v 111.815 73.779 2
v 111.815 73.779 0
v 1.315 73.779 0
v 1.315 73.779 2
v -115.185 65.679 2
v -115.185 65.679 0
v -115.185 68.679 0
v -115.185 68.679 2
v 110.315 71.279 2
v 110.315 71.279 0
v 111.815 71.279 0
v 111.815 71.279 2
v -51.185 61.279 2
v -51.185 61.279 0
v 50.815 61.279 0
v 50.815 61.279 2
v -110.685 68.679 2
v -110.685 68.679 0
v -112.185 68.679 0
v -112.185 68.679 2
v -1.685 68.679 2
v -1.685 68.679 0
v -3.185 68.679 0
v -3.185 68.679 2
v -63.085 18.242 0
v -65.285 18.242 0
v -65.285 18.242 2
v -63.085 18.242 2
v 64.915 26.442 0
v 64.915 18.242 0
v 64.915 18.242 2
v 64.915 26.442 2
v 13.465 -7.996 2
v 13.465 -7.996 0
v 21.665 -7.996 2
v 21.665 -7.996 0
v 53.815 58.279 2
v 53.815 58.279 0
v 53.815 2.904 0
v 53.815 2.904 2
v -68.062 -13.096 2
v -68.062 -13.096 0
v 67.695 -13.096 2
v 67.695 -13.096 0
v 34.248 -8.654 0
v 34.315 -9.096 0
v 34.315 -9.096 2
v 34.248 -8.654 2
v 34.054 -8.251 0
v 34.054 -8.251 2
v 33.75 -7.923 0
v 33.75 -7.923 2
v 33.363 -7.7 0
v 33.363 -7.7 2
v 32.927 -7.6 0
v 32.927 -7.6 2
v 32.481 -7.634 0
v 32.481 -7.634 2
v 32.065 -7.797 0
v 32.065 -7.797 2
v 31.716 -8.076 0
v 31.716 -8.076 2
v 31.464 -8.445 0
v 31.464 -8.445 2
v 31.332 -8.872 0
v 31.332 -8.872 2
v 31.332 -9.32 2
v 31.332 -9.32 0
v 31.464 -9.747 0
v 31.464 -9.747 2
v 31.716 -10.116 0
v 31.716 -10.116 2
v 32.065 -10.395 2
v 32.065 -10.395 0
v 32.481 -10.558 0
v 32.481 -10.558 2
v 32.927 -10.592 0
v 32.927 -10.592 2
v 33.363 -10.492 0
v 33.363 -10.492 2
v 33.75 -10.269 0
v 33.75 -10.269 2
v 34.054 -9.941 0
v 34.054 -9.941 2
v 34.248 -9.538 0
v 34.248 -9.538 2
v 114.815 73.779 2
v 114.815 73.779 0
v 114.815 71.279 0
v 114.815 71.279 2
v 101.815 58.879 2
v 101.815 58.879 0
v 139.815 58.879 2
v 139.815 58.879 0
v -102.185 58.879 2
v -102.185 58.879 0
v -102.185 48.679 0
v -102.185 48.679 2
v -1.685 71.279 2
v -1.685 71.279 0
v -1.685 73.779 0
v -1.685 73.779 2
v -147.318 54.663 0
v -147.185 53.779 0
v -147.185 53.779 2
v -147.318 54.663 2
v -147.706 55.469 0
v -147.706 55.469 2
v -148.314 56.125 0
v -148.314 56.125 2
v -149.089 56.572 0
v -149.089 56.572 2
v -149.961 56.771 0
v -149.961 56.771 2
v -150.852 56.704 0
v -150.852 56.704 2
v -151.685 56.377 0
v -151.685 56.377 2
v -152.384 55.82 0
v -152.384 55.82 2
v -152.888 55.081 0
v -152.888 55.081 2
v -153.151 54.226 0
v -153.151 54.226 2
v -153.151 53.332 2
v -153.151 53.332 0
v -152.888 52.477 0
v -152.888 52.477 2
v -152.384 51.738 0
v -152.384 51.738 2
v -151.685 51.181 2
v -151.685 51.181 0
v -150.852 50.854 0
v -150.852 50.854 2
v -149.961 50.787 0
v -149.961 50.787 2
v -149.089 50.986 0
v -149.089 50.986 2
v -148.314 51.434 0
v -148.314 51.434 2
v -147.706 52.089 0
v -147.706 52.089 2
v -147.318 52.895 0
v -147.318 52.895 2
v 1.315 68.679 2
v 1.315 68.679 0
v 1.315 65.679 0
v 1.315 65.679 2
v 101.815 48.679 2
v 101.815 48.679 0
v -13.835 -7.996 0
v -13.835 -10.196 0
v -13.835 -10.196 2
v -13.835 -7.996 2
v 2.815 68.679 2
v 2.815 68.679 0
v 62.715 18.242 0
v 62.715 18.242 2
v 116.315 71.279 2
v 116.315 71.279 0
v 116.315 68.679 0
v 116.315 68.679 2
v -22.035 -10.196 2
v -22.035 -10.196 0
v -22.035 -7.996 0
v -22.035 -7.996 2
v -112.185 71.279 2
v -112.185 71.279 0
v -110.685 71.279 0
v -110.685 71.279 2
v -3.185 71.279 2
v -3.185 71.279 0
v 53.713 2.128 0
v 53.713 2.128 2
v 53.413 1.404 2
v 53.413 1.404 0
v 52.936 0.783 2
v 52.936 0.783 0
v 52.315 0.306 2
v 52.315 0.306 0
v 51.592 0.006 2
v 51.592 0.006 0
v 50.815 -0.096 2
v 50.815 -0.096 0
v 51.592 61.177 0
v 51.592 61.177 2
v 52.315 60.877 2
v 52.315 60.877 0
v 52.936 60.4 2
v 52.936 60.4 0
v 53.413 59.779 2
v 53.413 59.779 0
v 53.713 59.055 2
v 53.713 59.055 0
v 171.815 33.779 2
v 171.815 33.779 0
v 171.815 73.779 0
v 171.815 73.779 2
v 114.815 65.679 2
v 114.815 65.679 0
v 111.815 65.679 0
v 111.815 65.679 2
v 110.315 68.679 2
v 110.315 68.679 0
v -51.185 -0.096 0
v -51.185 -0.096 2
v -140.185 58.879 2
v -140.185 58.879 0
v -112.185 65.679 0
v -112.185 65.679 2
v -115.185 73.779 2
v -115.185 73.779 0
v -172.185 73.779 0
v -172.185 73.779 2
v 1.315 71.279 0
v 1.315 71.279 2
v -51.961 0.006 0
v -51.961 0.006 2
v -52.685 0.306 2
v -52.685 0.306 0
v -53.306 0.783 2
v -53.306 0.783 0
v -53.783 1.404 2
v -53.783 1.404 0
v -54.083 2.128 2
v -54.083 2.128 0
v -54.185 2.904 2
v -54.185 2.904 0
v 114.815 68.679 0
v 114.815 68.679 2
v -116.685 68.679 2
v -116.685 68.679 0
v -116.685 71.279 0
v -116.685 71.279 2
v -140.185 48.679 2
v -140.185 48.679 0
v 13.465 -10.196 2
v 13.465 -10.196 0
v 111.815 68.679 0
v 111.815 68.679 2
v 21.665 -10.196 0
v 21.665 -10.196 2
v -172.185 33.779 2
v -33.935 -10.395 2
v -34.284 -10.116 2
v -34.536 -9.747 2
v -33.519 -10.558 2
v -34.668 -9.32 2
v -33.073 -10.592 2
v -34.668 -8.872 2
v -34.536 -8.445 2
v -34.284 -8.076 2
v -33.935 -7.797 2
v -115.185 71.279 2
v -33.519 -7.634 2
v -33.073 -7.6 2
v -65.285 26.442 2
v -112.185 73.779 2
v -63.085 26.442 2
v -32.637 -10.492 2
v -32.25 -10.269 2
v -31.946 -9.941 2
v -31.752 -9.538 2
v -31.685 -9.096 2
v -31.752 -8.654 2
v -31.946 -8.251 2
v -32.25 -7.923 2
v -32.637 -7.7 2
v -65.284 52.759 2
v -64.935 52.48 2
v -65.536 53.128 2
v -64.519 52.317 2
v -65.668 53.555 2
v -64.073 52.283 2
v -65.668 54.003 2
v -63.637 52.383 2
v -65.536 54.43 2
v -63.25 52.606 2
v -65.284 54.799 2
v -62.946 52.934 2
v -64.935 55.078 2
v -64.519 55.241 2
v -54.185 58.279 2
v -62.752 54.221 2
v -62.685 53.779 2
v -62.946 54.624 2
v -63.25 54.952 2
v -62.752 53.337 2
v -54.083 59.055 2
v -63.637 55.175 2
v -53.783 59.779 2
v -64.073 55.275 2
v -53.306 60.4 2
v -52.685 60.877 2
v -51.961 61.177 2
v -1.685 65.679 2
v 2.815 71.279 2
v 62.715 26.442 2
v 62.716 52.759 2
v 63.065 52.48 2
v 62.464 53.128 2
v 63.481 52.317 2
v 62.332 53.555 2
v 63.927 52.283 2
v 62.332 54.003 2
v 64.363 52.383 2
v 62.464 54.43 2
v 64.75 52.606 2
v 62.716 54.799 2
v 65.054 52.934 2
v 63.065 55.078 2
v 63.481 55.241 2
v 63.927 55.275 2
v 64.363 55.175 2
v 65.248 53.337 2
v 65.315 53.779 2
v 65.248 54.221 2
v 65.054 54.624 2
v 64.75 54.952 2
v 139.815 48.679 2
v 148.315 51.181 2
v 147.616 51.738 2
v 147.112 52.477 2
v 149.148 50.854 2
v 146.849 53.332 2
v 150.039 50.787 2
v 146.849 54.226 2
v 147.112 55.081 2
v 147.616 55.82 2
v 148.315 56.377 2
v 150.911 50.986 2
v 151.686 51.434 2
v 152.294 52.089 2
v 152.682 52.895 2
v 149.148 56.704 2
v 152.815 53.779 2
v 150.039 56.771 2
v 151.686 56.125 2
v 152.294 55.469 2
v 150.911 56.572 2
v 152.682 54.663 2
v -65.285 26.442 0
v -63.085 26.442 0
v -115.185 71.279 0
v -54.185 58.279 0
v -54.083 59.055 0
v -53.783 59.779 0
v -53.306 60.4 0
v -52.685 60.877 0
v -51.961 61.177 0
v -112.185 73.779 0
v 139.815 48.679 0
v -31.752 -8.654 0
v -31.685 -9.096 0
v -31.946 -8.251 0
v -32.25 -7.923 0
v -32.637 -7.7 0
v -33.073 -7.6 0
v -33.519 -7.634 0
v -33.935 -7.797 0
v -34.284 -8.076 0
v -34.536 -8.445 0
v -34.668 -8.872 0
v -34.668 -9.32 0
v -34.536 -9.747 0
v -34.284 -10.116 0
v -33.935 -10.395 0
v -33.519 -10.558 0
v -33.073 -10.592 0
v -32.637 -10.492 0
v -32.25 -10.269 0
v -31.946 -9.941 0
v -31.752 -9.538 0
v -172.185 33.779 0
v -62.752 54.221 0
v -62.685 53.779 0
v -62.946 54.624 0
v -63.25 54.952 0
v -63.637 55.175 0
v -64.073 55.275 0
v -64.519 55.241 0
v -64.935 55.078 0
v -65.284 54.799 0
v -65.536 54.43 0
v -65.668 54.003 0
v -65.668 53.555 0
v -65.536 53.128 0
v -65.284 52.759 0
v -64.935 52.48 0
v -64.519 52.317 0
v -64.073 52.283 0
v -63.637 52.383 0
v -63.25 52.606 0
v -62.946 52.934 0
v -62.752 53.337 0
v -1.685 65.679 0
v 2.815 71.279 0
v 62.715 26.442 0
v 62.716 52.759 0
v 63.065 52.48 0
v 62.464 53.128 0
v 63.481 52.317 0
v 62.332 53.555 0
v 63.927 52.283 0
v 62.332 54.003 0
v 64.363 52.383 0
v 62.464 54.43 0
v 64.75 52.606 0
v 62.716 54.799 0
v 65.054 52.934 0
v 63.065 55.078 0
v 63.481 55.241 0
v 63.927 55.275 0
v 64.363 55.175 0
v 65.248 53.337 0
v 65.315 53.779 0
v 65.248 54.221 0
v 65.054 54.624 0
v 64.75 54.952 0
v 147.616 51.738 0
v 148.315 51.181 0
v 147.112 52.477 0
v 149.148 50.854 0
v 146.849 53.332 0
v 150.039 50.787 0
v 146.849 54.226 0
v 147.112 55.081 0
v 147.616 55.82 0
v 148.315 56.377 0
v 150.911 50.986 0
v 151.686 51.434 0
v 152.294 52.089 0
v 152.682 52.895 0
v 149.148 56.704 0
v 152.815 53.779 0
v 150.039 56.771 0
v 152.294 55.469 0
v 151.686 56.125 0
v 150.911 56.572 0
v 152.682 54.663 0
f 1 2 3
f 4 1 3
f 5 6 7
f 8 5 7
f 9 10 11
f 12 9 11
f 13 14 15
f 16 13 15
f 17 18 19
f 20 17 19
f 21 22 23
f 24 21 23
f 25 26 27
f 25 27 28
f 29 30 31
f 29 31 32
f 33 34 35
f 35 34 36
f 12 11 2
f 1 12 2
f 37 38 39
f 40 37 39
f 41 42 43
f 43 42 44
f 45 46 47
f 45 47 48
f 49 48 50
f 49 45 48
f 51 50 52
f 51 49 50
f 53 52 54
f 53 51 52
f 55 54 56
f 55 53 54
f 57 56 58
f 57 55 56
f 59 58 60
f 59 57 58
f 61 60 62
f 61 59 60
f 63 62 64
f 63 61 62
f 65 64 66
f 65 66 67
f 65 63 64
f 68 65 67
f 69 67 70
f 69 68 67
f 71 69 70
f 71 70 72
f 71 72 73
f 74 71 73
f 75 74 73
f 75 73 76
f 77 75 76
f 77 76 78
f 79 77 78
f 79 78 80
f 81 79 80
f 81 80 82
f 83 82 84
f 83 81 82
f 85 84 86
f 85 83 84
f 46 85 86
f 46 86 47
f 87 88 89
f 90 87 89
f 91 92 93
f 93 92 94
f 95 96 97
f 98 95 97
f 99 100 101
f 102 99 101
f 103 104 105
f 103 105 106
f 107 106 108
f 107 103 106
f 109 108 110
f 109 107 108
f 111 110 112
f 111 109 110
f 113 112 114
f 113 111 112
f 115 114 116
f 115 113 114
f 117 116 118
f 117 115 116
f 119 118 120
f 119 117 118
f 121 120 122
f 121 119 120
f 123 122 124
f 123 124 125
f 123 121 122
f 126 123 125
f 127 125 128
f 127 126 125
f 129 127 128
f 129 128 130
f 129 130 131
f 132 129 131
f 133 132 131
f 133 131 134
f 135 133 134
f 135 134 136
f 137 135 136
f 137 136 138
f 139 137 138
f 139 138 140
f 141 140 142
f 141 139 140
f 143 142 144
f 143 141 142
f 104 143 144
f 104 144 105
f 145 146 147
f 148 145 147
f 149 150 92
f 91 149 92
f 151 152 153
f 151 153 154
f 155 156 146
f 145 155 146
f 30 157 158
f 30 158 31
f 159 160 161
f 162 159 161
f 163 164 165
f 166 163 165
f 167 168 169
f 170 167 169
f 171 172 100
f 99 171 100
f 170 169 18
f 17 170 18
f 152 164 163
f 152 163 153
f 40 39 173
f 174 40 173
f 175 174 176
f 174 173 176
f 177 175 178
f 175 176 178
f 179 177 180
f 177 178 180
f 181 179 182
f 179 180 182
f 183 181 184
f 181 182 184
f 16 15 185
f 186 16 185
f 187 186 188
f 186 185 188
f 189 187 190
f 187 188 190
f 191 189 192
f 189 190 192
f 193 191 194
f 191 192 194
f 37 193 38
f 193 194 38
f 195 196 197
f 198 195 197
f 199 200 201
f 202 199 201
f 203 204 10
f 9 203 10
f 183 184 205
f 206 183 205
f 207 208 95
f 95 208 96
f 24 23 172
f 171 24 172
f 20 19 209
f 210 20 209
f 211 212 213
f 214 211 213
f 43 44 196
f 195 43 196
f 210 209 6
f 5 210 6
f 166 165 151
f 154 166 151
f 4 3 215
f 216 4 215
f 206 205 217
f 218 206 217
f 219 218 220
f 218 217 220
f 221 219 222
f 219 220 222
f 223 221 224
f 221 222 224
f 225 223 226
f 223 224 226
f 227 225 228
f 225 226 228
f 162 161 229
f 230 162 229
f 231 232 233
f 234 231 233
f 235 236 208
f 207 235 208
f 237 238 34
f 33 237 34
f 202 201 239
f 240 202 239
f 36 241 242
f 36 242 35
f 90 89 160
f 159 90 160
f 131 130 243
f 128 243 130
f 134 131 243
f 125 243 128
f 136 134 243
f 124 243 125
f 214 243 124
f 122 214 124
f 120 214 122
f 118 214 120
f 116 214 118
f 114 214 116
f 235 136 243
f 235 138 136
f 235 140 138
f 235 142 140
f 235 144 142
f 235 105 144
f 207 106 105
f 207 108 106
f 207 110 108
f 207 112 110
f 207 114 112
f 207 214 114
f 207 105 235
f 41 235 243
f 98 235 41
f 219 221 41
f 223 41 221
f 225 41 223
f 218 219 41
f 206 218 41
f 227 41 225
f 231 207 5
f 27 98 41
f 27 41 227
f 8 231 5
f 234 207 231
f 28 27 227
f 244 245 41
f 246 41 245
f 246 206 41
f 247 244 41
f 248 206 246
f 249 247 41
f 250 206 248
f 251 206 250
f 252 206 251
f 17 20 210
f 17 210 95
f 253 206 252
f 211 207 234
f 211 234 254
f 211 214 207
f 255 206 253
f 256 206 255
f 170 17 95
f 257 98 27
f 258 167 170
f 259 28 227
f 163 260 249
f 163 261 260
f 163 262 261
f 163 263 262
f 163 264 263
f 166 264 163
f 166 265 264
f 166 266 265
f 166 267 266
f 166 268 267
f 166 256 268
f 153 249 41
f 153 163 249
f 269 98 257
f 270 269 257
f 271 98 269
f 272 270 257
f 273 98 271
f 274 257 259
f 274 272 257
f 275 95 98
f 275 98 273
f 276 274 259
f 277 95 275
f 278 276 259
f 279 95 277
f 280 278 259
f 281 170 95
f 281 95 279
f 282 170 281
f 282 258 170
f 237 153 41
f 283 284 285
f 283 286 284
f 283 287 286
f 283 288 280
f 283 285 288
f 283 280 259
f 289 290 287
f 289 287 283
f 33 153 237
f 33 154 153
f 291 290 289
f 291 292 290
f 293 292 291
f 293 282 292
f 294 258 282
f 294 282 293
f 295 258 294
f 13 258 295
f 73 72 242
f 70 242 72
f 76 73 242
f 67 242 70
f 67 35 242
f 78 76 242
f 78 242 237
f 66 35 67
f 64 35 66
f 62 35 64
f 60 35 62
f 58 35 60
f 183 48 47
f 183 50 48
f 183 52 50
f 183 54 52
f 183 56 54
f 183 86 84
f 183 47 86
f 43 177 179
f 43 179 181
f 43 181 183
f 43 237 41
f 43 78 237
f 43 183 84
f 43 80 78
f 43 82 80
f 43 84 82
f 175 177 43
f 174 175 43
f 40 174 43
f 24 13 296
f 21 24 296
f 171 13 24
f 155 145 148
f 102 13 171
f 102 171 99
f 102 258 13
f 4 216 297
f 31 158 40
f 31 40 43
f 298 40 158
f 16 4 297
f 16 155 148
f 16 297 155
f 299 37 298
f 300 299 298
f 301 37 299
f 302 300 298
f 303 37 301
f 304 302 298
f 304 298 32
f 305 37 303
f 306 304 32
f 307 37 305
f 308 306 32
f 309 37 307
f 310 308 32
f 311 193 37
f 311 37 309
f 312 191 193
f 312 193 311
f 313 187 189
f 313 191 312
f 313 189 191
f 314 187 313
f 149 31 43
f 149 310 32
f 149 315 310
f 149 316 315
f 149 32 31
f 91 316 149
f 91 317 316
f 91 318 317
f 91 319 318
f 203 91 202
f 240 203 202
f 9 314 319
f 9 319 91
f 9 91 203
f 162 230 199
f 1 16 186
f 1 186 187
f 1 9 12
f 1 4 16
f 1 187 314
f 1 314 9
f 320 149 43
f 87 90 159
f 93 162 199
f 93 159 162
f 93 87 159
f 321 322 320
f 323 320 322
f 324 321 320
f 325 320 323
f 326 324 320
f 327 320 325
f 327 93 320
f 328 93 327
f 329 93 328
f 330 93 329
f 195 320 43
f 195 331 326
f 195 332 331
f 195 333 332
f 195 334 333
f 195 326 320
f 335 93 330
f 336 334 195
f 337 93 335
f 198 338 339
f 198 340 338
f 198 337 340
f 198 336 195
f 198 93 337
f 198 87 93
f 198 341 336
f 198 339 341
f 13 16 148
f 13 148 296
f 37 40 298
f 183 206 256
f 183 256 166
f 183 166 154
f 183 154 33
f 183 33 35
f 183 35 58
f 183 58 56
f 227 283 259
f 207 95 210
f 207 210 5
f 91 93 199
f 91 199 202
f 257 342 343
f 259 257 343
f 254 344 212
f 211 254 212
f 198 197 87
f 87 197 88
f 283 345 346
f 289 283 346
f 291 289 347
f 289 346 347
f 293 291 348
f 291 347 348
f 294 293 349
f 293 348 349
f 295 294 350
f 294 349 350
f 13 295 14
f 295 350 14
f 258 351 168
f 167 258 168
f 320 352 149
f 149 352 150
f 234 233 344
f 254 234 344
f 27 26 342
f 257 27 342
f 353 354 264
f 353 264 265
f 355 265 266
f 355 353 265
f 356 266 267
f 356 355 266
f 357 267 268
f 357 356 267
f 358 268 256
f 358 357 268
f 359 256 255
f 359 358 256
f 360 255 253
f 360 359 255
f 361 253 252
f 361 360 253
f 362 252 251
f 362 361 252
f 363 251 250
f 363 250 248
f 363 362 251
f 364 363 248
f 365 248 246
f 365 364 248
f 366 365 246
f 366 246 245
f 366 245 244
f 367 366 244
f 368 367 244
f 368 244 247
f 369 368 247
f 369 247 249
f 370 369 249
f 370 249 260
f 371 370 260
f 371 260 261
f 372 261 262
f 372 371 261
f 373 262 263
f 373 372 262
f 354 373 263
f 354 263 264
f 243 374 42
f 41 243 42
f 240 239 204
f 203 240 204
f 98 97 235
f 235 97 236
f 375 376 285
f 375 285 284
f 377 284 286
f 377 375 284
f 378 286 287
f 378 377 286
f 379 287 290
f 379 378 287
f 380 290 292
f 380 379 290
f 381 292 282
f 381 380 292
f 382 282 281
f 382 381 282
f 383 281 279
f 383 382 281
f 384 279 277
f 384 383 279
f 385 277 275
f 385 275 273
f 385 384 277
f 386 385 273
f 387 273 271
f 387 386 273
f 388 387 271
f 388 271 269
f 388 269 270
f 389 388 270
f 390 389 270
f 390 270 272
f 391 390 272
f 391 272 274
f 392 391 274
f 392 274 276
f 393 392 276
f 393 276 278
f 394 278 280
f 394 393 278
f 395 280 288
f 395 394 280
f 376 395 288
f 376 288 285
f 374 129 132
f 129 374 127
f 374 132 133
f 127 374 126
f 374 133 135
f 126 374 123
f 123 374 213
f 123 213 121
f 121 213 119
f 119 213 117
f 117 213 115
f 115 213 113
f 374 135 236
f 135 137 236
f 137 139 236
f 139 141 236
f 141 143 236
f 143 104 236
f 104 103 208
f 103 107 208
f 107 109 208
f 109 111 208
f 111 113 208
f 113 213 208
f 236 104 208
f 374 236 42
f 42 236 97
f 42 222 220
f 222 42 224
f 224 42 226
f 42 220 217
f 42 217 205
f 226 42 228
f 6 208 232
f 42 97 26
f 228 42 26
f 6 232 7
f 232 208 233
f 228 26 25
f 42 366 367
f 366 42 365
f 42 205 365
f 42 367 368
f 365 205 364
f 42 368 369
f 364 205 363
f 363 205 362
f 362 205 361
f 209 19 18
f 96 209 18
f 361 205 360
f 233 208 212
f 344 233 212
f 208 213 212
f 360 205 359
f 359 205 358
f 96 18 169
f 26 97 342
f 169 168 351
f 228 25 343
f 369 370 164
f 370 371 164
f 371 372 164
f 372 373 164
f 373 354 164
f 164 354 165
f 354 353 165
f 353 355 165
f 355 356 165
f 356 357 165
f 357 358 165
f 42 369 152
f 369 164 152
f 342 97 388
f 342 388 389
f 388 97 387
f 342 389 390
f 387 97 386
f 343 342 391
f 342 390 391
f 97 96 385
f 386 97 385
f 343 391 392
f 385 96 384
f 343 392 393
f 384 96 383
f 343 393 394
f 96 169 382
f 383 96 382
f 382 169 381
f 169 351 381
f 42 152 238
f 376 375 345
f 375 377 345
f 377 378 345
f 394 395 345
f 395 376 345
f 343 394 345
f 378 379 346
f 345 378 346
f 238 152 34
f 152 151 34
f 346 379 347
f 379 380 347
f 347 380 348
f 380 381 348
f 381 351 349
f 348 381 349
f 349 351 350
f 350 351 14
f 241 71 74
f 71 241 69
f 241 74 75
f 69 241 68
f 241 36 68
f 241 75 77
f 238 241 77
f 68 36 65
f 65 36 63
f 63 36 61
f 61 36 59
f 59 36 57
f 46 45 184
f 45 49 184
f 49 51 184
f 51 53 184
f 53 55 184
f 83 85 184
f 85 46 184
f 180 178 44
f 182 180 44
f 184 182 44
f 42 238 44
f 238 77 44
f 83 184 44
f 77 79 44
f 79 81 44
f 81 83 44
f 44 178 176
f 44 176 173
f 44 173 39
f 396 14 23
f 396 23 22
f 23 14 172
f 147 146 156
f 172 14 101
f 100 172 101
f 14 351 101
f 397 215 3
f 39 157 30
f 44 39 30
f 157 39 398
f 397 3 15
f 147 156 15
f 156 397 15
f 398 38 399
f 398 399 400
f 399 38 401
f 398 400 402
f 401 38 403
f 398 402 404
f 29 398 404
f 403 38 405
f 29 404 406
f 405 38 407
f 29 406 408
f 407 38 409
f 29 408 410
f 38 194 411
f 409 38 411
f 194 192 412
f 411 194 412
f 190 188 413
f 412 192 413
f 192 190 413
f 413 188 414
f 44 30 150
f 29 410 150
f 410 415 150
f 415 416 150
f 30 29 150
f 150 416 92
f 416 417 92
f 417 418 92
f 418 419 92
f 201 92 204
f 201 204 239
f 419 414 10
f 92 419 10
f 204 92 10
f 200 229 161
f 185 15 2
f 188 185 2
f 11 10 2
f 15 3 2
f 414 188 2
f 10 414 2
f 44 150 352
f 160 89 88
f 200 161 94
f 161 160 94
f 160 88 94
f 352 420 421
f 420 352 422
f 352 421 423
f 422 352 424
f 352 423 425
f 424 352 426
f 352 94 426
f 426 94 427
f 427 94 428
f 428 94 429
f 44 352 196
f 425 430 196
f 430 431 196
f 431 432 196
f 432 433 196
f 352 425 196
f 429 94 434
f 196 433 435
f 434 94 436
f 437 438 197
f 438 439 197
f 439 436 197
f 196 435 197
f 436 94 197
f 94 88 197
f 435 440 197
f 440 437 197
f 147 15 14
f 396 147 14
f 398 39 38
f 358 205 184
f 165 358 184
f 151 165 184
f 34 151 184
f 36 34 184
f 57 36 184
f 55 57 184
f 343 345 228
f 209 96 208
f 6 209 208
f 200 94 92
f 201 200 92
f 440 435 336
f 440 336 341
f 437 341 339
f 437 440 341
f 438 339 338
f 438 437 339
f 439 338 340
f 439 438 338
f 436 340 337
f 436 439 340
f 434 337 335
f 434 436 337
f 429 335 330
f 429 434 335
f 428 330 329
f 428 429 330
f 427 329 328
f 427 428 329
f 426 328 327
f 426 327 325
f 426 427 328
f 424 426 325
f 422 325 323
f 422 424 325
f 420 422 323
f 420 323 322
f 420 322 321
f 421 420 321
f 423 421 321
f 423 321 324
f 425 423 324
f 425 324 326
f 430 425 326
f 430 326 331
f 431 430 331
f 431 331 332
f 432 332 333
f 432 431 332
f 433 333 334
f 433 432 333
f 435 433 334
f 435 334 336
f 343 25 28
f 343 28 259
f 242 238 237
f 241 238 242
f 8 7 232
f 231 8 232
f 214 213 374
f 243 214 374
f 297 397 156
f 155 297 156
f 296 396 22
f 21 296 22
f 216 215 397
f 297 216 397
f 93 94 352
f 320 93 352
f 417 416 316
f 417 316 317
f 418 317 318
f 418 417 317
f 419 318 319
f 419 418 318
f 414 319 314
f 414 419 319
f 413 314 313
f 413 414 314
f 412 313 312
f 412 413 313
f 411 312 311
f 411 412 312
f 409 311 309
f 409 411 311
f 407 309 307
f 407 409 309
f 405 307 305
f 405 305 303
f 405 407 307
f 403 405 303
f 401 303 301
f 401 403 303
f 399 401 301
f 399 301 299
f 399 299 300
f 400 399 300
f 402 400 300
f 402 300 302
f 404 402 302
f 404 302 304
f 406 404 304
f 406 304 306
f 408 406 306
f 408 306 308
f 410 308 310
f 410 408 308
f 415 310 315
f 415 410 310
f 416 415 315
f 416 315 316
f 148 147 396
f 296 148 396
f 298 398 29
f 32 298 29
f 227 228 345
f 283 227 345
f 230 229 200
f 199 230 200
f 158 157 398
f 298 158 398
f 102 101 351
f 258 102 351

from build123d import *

# Parameters (mm, degrees)
SKETCH_1_R      = 1.5
SKETCH_1_W      = 8.2
SKETCH_1_H      = 2.2
SKETCH_1_W_2    = 2.2
SKETCH_1_H_2    = 8.2
SKETCH_1_R_2    = 3
EXTRUDE_1_DEPTH = 2


with BuildPart() as part:
    # 草图1 → 凸台-拉伸1 (new body)
    with BuildSketch(Plane.XY):
        Polygon((-68.061769393, -13.095981945), (-52.184883937, -13.095981945), (-18.934883937, -13.095981945), (18.565116063, -13.095981945), (67.695116063, -13.095981945), (171.815116063, 33.779018055), (171.815116063, 73.779018055), (114.815116063, 73.779018055), (114.815116063, 71.279018055), (116.315116063, 71.279018055), (116.315116063, 68.679018055), (114.815116063, 68.679018055), (114.815116063, 65.679018055), (111.815116063, 65.679018055), (111.815116063, 68.679018055), (110.315116063, 68.679018055), (110.315116063, 71.279018055), (111.815116063, 71.279018055), (111.815116063, 73.779018055), (1.315116063, 73.779018055), (1.315116063, 71.279018055), (2.815116063, 71.279018055), (2.815116063, 68.679018055), (1.315116063, 68.679018055), (1.315116063, 65.679018055), (-1.684883937, 65.679018055), (-1.684883937, 68.679018055), (-3.184883937, 68.679018055), (-3.184883937, 71.279018055), (-1.684883937, 71.279018055), (-1.684883937, 73.779018055), (-68.061769393, 73.779018055), (-112.184883937, 73.779018055), (-112.184883937, 71.279018055), (-110.684883937, 71.279018055), (-110.684883937, 68.679018055), (-112.184883937, 68.679018055), (-112.184883937, 65.679018055), (-115.184883937, 65.679018055), (-115.184883937, 68.679018055), (-116.684883937, 68.679018055), (-116.684883937, 71.279018055), (-115.184883937, 71.279018055), (-115.184883937, 73.779018055), (-172.184883937, 73.779018055), (-172.184883937, 33.779018055), align=None)
        with Locations((-33.184883937, -9.095981945)):
            Circle(SKETCH_1_R, mode=Mode.SUBTRACT)
        with Locations((-17.934883937, -9.095981946)):
            Rectangle(SKETCH_1_W, SKETCH_1_H, mode=Mode.SUBTRACT)
        with Locations((-64.184883937, 22.341518055)):
            Rectangle(SKETCH_1_W_2, SKETCH_1_H_2, mode=Mode.SUBTRACT)
        with Locations((17.565116063, -9.095981946)):
            Rectangle(SKETCH_1_W, SKETCH_1_H, mode=Mode.SUBTRACT)
        with Locations((32.815116063, -9.095981945)):
            Circle(SKETCH_1_R, mode=Mode.SUBTRACT)
        with Locations((63.815116063, 22.341518055)):
            Rectangle(SKETCH_1_W_2, SKETCH_1_H_2, mode=Mode.SUBTRACT)
        with BuildLine():
            ThreePointArc((50.815116063, 61.279018055), (52.936436406, 60.400338398), (53.815116063, 58.279018055))
            Line((53.815116063, 58.279018055), (53.815116063, 2.904018055))
            ThreePointArc((53.815116063, 2.904018055), (52.936436406, 0.782697711), (50.815116063, -0.095981945))
            Line((50.815116063, -0.095981945), (-51.184883937, -0.095981945))
            ThreePointArc((-51.184883937, -0.095981945), (-53.306204281, 0.782697711), (-54.184883937, 2.904018055))
            Line((-54.184883937, 2.904018055), (-54.184883937, 58.279018055))
            ThreePointArc((-54.184883937, 58.279018055), (-53.306204281, 60.400338398), (-51.184883937, 61.279018055))
            Line((-51.184883937, 61.279018055), (50.815116063, 61.279018055))
        make_face(mode=Mode.SUBTRACT)
        with Locations((-150.184883937, 53.779018055)):
            Circle(SKETCH_1_R_2, mode=Mode.SUBTRACT)
        Polygon((-140.184883937, 58.879018055), (-125.184883937, 58.879018055), (-102.184883937, 58.879018055), (-102.184883937, 48.679018055), (-125.184883937, 48.679018055), (-140.184883937, 48.679018055), align=None, mode=Mode.SUBTRACT)
        with Locations((-64.184883937, 53.779018055)):
            Circle(SKETCH_1_R, mode=Mode.SUBTRACT)
        with Locations((63.815116063, 53.779018055)):
            Circle(SKETCH_1_R, mode=Mode.SUBTRACT)
        Polygon((139.815116063, 48.679018055), (124.815116063, 48.679018055), (101.815116063, 48.679018055), (101.815116063, 58.879018055), (124.815116063, 58.879018055), (139.815116063, 58.879018055), align=None, mode=Mode.SUBTRACT)
        with Locations((149.815116063, 53.779018055)):
            Circle(SKETCH_1_R_2, mode=Mode.SUBTRACT)
    extrude(amount=EXTRUDE_1_DEPTH)


solid = part.part
